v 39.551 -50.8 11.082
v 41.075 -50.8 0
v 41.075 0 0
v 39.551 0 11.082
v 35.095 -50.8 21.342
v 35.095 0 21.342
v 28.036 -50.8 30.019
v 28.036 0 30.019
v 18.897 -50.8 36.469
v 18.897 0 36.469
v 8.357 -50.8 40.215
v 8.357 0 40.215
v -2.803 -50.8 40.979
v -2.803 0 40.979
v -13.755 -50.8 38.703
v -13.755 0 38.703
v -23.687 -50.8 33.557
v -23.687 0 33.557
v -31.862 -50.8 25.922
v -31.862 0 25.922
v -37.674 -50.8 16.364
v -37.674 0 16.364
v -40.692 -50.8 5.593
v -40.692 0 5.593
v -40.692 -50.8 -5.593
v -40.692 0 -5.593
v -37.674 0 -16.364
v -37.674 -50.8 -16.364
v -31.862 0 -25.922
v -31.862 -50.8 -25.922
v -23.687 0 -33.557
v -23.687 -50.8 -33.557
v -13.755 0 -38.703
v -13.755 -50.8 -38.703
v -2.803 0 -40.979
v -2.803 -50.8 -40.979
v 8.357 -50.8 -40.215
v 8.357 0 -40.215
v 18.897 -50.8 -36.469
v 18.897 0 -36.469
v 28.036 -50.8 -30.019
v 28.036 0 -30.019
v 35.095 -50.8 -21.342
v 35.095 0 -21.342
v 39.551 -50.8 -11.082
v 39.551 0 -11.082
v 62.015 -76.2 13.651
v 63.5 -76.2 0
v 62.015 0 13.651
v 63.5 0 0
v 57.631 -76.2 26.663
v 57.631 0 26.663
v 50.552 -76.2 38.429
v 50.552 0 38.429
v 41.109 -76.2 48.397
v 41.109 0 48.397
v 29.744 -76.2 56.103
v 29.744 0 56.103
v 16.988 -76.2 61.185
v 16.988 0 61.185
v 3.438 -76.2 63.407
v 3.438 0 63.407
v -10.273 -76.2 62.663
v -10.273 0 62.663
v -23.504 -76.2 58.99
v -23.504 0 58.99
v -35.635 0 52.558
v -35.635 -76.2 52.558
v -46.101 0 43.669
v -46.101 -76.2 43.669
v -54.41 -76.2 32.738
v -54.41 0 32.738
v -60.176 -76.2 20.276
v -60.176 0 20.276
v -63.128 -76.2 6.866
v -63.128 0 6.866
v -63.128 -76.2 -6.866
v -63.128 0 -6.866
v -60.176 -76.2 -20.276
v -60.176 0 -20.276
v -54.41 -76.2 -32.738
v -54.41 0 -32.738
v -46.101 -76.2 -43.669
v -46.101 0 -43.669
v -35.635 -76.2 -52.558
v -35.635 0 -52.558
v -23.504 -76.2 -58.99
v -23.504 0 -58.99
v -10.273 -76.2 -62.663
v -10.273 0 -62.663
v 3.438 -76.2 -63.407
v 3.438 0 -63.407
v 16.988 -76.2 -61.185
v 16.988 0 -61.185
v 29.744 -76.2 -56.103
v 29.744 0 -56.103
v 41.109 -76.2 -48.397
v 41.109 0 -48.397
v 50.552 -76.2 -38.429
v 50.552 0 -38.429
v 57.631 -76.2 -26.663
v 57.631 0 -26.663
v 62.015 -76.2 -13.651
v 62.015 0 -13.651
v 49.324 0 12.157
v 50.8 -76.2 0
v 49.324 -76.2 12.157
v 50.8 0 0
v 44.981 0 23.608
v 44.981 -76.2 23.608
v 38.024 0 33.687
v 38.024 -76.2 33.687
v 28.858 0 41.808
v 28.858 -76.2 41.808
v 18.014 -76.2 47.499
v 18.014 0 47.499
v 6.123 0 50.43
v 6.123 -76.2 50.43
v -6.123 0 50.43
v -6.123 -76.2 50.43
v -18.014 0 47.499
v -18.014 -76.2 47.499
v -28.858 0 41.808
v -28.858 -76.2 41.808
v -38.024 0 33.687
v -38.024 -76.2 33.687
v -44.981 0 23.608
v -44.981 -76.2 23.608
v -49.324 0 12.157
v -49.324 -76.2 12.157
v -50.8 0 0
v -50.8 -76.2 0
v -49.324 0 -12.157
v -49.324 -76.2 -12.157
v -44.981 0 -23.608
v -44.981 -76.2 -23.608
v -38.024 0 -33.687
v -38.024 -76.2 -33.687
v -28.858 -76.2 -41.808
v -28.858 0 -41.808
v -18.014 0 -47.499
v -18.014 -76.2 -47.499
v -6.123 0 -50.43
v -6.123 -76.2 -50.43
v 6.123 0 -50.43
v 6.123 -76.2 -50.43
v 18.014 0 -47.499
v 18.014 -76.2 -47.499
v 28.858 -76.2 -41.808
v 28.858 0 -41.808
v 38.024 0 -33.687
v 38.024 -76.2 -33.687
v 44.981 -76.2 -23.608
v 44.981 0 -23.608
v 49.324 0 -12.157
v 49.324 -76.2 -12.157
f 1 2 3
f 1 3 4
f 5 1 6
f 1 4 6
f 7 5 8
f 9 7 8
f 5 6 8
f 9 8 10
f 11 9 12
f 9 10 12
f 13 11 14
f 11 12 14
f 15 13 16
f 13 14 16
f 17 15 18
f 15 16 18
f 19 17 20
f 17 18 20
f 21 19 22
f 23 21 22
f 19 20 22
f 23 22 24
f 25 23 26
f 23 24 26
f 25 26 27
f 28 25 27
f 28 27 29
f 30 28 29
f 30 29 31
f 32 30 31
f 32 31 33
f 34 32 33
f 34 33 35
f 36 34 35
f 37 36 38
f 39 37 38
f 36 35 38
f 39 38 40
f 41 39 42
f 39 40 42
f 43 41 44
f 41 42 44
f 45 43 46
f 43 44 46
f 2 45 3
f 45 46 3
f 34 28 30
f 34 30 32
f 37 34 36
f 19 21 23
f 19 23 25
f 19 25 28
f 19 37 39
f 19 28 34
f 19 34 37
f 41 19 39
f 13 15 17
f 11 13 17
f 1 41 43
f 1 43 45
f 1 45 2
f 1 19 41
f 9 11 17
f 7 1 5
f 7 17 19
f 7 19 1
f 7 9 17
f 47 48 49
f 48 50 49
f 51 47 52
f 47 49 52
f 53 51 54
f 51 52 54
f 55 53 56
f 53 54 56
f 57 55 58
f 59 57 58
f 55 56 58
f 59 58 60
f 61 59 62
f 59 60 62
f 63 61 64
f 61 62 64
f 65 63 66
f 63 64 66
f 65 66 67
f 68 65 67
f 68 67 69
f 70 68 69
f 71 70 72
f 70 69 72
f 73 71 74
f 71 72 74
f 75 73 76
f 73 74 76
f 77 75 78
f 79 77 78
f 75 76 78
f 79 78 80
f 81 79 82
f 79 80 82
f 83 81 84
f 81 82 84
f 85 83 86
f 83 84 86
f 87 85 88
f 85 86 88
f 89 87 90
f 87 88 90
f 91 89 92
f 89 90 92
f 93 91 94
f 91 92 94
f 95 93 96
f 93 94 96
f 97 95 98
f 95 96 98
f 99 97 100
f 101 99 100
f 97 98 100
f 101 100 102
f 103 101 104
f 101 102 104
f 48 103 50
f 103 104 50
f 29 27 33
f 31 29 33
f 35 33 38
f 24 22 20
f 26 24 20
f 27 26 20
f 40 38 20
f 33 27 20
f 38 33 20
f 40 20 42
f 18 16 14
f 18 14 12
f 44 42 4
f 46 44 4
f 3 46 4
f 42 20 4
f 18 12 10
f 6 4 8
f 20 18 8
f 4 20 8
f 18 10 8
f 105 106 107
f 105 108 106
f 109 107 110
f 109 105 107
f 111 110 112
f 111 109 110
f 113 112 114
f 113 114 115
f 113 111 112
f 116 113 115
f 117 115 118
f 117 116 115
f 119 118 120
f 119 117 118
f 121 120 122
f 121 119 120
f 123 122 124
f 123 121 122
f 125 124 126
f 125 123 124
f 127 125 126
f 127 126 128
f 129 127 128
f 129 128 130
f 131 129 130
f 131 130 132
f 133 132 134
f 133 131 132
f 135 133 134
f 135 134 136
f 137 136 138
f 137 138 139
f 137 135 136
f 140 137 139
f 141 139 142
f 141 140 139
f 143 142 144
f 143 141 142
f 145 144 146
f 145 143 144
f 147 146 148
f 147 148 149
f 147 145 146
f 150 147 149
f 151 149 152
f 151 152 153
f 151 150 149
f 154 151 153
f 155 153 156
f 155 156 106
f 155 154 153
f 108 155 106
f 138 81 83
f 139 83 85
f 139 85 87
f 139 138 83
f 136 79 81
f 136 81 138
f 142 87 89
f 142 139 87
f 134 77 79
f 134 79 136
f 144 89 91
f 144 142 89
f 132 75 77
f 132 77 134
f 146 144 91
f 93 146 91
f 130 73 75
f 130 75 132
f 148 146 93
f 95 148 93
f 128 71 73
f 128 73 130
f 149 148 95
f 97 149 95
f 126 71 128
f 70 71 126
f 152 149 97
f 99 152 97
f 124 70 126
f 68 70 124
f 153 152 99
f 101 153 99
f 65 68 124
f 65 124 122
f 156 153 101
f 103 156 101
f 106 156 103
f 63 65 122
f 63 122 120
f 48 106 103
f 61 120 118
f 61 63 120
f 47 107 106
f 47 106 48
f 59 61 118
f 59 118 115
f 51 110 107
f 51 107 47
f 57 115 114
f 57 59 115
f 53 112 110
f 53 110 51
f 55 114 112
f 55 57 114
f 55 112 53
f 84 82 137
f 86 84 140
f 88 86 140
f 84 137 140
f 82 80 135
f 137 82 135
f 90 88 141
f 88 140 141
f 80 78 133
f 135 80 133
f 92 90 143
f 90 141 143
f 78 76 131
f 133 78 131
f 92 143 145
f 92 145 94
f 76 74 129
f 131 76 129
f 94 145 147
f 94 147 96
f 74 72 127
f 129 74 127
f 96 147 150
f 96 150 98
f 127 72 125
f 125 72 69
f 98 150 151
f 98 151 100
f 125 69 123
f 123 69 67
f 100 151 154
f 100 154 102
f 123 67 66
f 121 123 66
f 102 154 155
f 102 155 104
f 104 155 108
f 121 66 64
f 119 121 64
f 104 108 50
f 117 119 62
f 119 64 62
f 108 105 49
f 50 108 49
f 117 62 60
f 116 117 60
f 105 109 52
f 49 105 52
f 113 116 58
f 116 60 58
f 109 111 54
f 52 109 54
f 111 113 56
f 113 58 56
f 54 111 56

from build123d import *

# Parameters (mm, degrees)
F0_R     = 63.5
F0_R_2   = 50.8
F1_DEPTH = 50.8
F2_W     = 50.8
F2_H     = 50.8
F3_DEPTH = 50.8
F4_R     = 41.0745655778
F5_DEPTH = 25.4
F6_DEPTH = 25.4
F7_DEPTH = 25.4


# Not quite as in the source:
# - a feature names something its author has since deleted; it is built from what else it names


with BuildPart() as f1:
    # F0 (on Front) → F1 (new body)
    with BuildSketch(Plane.XZ):
        Circle(F0_R)
        Circle(F0_R_2, mode=Mode.SUBTRACT)
    extrude(amount=F1_DEPTH)

    # F6 (add): a face of the model
    f6_faces = [f1.faces().sort_by_distance(p)[0] for p in [
        (-61.7039487758, -50.8, 0),
    ]]
    extrude(f6_faces, amount=F6_DEPTH)


with BuildPart() as f3:
    # F2 (on Front) → F3 (new body)
    with BuildSketch(Plane.XZ):
        Rectangle(F2_W, F2_H)
    extrude(amount=F3_DEPTH)

    # F4 (on Front) → F5 (join)
    with BuildSketch(Plane.XZ):
        Circle(F4_R)
    extrude(amount=F5_DEPTH)

    # F7 (add): a face of the model
    f7_faces = [f3.faces().sort_by_distance(p)[0] for p in [
        (-39.9128014236, -25.4, 0),
    ]]
    extrude(f7_faces, amount=F7_DEPTH)


solid = Compound([f1.part, f3.part])
